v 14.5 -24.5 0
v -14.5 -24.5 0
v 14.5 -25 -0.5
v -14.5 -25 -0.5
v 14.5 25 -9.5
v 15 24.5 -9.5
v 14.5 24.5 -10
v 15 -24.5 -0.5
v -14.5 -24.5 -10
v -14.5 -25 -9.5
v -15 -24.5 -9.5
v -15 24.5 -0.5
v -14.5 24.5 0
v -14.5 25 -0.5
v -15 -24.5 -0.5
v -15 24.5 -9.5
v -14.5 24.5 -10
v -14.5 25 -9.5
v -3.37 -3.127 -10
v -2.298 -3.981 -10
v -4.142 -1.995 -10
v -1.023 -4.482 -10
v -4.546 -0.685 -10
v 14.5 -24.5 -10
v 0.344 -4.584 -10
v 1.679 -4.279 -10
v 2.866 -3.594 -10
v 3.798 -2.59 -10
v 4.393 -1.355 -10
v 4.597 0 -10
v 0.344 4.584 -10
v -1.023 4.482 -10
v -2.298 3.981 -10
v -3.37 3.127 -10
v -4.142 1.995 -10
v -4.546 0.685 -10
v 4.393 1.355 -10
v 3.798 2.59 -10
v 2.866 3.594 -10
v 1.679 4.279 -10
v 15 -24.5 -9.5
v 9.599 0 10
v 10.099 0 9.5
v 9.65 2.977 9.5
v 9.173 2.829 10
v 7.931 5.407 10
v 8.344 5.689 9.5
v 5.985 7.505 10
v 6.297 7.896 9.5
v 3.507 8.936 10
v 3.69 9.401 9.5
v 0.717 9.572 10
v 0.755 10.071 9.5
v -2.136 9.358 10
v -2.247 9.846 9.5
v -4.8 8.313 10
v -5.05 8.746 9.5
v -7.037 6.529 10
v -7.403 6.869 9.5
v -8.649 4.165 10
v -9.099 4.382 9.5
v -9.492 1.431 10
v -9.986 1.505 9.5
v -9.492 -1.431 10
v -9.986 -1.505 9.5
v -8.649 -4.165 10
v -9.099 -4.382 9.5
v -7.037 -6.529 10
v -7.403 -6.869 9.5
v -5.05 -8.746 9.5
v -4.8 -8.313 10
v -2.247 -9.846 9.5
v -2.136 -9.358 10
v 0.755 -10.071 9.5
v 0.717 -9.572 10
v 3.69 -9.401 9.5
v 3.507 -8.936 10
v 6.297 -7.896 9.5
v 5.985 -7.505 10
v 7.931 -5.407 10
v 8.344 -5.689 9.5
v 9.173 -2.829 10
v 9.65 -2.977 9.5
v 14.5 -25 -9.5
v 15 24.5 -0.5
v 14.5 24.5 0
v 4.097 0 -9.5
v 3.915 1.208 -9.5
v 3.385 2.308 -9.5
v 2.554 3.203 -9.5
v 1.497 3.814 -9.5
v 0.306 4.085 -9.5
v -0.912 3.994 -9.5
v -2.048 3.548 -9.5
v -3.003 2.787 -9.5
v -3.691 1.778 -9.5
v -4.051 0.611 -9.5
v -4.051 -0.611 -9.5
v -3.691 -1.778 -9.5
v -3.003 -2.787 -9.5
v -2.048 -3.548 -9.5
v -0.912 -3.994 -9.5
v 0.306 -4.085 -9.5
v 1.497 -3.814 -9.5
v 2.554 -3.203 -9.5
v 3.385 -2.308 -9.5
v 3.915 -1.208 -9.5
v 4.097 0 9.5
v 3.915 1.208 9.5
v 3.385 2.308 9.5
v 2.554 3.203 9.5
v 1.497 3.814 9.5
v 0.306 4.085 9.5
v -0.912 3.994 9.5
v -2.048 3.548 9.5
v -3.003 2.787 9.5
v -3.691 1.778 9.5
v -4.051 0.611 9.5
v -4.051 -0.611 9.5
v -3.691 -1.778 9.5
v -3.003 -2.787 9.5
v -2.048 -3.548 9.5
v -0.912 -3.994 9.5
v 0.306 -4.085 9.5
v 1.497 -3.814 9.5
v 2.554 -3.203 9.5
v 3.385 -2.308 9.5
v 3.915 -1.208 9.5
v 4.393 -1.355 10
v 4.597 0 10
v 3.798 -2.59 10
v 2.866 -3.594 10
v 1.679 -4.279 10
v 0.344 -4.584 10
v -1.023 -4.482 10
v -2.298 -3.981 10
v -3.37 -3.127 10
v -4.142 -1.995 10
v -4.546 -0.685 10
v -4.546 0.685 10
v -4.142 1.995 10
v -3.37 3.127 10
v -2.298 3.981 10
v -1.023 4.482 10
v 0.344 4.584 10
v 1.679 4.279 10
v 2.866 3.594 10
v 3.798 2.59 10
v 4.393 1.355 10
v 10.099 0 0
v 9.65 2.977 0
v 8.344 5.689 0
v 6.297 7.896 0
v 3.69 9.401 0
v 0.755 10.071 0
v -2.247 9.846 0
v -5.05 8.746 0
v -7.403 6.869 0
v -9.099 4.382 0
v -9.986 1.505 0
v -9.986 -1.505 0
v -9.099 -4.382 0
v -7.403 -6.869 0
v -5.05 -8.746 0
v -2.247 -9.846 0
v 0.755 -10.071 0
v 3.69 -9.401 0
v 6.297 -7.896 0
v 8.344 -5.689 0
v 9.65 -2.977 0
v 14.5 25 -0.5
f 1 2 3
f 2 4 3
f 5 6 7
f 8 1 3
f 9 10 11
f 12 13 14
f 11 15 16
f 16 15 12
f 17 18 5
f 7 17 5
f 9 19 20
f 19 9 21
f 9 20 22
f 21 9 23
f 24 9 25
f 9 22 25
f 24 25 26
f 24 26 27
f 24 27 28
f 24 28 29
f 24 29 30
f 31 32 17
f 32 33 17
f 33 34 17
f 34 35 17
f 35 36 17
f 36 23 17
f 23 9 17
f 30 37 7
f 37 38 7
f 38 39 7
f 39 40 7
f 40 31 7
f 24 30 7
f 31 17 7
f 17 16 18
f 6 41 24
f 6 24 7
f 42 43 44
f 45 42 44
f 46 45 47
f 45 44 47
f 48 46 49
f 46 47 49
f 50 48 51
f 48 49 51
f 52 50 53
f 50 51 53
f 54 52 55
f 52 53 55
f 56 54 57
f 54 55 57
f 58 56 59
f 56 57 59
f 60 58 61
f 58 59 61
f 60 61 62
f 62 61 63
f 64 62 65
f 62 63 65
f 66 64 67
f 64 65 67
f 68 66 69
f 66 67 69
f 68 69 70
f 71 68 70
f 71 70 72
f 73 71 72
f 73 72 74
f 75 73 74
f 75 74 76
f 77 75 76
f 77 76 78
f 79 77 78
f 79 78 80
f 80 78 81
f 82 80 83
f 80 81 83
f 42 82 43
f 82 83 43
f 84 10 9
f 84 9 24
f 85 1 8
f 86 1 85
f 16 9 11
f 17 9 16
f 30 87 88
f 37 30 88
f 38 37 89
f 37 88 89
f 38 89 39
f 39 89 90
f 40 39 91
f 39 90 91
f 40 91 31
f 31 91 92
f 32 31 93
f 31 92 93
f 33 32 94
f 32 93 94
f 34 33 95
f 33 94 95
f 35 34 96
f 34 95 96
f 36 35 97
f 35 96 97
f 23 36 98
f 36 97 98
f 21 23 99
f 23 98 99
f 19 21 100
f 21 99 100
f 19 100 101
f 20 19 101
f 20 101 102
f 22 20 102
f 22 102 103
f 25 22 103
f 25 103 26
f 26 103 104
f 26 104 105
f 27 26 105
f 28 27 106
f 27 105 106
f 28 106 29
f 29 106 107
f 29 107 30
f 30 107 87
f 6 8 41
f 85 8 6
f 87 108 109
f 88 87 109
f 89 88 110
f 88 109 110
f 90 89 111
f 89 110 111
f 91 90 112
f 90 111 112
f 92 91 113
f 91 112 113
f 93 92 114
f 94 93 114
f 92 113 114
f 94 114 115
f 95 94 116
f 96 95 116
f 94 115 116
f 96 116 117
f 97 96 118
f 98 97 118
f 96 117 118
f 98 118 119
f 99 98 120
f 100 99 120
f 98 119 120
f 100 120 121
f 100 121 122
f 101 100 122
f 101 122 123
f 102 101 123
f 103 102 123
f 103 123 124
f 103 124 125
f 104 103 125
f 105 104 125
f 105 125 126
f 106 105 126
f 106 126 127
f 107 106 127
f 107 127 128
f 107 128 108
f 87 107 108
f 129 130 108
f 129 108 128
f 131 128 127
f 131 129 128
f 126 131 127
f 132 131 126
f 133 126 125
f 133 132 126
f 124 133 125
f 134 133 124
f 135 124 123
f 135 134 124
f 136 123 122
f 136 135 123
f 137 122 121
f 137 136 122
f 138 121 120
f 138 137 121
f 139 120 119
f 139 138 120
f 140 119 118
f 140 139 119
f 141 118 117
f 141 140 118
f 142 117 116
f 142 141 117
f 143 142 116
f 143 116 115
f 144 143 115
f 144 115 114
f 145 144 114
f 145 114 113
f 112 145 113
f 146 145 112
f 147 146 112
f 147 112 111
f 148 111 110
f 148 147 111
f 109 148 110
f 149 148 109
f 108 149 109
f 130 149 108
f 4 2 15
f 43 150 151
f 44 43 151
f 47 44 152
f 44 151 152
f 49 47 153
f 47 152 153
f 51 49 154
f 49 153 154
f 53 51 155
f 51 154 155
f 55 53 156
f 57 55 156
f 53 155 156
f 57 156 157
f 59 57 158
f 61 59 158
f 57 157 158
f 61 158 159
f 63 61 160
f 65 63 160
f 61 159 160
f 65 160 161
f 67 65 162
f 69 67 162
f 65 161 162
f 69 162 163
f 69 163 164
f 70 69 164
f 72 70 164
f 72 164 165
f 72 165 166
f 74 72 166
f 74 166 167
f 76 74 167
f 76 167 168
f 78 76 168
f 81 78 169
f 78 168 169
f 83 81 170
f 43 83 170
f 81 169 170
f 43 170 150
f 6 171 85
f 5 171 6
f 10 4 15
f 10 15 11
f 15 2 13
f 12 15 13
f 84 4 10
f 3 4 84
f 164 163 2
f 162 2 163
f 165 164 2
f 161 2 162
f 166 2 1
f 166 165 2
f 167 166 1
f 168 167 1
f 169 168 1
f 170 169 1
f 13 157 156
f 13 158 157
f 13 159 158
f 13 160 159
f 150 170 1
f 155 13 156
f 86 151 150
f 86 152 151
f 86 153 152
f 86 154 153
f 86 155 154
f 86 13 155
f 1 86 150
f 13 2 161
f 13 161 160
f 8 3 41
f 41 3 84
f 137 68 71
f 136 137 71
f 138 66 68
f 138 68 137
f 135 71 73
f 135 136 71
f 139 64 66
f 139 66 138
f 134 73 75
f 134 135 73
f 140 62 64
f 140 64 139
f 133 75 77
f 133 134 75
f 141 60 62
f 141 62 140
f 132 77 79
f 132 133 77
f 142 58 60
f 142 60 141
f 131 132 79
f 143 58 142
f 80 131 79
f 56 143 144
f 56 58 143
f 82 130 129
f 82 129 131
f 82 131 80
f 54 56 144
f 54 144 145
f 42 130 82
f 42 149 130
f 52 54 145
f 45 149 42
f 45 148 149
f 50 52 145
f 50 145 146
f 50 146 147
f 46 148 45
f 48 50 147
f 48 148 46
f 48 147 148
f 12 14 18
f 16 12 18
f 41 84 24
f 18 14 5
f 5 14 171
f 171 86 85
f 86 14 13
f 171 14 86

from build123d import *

# Parameters (mm, degrees)
F0_W          = 30
F0_H          = 50
F1_DEPTH      = 10
F2_R          = 10.0991386475
F3_DEPTH      = 10
F4_R          = 4.0969126616
F5_DEPTH      = 25
F5_DEPTH_BACK = 25
F6_SIZE       = 0.5
F7_SIZE       = 0.5


# Not quite as in the source:
# - a feature names something its author has since deleted; it is built from what else it names


with BuildPart() as f1:
    # F0 (on Top) → F1 (new body)
    with BuildSketch(Plane.XY):
        Rectangle(F0_W, F0_H)
    extrude(amount=-F1_DEPTH)

    # F2 (on Top) → F3 (join)
    with BuildSketch(Plane.XY):
        Circle(F2_R)
    extrude(amount=F3_DEPTH)

    # F4 (on Top) → F5 (cut, two sides)
    with BuildSketch(Plane.XY) as f5_sk:
        Circle(F4_R)
    extrude(amount=-F5_DEPTH, mode=Mode.SUBTRACT)
    extrude(f5_sk.sketch, amount=F5_DEPTH_BACK, mode=Mode.SUBTRACT)

    # F6
    f6_edges = [f1.edges().sort_by_distance(p)[0] for p in [
        (15, 0, 0),
        (0, -25, 0),
        (-15, 0, 0),
        (0, 25, 0),
        (-10.099139, 0, 10),
        (-4.096913, 0, 10),
        (15, -25, -5),
        (15, 25, -5),
        (-15, -25, -5),
        (0, -25, -10),
        (15, 0, -10),
        (-15, 25, -5),
        (-15, 0, -10),
        (0, 25, -10),
    ]]
    chamfer(f6_edges, length=F6_SIZE)

    # F7
    f7_edges = [f1.edges().sort_by_distance(p)[0] for p in [
        (-4.096913, 0, -10),
    ]]
    chamfer(f7_edges, length=F7_SIZE)


solid = f1.part
